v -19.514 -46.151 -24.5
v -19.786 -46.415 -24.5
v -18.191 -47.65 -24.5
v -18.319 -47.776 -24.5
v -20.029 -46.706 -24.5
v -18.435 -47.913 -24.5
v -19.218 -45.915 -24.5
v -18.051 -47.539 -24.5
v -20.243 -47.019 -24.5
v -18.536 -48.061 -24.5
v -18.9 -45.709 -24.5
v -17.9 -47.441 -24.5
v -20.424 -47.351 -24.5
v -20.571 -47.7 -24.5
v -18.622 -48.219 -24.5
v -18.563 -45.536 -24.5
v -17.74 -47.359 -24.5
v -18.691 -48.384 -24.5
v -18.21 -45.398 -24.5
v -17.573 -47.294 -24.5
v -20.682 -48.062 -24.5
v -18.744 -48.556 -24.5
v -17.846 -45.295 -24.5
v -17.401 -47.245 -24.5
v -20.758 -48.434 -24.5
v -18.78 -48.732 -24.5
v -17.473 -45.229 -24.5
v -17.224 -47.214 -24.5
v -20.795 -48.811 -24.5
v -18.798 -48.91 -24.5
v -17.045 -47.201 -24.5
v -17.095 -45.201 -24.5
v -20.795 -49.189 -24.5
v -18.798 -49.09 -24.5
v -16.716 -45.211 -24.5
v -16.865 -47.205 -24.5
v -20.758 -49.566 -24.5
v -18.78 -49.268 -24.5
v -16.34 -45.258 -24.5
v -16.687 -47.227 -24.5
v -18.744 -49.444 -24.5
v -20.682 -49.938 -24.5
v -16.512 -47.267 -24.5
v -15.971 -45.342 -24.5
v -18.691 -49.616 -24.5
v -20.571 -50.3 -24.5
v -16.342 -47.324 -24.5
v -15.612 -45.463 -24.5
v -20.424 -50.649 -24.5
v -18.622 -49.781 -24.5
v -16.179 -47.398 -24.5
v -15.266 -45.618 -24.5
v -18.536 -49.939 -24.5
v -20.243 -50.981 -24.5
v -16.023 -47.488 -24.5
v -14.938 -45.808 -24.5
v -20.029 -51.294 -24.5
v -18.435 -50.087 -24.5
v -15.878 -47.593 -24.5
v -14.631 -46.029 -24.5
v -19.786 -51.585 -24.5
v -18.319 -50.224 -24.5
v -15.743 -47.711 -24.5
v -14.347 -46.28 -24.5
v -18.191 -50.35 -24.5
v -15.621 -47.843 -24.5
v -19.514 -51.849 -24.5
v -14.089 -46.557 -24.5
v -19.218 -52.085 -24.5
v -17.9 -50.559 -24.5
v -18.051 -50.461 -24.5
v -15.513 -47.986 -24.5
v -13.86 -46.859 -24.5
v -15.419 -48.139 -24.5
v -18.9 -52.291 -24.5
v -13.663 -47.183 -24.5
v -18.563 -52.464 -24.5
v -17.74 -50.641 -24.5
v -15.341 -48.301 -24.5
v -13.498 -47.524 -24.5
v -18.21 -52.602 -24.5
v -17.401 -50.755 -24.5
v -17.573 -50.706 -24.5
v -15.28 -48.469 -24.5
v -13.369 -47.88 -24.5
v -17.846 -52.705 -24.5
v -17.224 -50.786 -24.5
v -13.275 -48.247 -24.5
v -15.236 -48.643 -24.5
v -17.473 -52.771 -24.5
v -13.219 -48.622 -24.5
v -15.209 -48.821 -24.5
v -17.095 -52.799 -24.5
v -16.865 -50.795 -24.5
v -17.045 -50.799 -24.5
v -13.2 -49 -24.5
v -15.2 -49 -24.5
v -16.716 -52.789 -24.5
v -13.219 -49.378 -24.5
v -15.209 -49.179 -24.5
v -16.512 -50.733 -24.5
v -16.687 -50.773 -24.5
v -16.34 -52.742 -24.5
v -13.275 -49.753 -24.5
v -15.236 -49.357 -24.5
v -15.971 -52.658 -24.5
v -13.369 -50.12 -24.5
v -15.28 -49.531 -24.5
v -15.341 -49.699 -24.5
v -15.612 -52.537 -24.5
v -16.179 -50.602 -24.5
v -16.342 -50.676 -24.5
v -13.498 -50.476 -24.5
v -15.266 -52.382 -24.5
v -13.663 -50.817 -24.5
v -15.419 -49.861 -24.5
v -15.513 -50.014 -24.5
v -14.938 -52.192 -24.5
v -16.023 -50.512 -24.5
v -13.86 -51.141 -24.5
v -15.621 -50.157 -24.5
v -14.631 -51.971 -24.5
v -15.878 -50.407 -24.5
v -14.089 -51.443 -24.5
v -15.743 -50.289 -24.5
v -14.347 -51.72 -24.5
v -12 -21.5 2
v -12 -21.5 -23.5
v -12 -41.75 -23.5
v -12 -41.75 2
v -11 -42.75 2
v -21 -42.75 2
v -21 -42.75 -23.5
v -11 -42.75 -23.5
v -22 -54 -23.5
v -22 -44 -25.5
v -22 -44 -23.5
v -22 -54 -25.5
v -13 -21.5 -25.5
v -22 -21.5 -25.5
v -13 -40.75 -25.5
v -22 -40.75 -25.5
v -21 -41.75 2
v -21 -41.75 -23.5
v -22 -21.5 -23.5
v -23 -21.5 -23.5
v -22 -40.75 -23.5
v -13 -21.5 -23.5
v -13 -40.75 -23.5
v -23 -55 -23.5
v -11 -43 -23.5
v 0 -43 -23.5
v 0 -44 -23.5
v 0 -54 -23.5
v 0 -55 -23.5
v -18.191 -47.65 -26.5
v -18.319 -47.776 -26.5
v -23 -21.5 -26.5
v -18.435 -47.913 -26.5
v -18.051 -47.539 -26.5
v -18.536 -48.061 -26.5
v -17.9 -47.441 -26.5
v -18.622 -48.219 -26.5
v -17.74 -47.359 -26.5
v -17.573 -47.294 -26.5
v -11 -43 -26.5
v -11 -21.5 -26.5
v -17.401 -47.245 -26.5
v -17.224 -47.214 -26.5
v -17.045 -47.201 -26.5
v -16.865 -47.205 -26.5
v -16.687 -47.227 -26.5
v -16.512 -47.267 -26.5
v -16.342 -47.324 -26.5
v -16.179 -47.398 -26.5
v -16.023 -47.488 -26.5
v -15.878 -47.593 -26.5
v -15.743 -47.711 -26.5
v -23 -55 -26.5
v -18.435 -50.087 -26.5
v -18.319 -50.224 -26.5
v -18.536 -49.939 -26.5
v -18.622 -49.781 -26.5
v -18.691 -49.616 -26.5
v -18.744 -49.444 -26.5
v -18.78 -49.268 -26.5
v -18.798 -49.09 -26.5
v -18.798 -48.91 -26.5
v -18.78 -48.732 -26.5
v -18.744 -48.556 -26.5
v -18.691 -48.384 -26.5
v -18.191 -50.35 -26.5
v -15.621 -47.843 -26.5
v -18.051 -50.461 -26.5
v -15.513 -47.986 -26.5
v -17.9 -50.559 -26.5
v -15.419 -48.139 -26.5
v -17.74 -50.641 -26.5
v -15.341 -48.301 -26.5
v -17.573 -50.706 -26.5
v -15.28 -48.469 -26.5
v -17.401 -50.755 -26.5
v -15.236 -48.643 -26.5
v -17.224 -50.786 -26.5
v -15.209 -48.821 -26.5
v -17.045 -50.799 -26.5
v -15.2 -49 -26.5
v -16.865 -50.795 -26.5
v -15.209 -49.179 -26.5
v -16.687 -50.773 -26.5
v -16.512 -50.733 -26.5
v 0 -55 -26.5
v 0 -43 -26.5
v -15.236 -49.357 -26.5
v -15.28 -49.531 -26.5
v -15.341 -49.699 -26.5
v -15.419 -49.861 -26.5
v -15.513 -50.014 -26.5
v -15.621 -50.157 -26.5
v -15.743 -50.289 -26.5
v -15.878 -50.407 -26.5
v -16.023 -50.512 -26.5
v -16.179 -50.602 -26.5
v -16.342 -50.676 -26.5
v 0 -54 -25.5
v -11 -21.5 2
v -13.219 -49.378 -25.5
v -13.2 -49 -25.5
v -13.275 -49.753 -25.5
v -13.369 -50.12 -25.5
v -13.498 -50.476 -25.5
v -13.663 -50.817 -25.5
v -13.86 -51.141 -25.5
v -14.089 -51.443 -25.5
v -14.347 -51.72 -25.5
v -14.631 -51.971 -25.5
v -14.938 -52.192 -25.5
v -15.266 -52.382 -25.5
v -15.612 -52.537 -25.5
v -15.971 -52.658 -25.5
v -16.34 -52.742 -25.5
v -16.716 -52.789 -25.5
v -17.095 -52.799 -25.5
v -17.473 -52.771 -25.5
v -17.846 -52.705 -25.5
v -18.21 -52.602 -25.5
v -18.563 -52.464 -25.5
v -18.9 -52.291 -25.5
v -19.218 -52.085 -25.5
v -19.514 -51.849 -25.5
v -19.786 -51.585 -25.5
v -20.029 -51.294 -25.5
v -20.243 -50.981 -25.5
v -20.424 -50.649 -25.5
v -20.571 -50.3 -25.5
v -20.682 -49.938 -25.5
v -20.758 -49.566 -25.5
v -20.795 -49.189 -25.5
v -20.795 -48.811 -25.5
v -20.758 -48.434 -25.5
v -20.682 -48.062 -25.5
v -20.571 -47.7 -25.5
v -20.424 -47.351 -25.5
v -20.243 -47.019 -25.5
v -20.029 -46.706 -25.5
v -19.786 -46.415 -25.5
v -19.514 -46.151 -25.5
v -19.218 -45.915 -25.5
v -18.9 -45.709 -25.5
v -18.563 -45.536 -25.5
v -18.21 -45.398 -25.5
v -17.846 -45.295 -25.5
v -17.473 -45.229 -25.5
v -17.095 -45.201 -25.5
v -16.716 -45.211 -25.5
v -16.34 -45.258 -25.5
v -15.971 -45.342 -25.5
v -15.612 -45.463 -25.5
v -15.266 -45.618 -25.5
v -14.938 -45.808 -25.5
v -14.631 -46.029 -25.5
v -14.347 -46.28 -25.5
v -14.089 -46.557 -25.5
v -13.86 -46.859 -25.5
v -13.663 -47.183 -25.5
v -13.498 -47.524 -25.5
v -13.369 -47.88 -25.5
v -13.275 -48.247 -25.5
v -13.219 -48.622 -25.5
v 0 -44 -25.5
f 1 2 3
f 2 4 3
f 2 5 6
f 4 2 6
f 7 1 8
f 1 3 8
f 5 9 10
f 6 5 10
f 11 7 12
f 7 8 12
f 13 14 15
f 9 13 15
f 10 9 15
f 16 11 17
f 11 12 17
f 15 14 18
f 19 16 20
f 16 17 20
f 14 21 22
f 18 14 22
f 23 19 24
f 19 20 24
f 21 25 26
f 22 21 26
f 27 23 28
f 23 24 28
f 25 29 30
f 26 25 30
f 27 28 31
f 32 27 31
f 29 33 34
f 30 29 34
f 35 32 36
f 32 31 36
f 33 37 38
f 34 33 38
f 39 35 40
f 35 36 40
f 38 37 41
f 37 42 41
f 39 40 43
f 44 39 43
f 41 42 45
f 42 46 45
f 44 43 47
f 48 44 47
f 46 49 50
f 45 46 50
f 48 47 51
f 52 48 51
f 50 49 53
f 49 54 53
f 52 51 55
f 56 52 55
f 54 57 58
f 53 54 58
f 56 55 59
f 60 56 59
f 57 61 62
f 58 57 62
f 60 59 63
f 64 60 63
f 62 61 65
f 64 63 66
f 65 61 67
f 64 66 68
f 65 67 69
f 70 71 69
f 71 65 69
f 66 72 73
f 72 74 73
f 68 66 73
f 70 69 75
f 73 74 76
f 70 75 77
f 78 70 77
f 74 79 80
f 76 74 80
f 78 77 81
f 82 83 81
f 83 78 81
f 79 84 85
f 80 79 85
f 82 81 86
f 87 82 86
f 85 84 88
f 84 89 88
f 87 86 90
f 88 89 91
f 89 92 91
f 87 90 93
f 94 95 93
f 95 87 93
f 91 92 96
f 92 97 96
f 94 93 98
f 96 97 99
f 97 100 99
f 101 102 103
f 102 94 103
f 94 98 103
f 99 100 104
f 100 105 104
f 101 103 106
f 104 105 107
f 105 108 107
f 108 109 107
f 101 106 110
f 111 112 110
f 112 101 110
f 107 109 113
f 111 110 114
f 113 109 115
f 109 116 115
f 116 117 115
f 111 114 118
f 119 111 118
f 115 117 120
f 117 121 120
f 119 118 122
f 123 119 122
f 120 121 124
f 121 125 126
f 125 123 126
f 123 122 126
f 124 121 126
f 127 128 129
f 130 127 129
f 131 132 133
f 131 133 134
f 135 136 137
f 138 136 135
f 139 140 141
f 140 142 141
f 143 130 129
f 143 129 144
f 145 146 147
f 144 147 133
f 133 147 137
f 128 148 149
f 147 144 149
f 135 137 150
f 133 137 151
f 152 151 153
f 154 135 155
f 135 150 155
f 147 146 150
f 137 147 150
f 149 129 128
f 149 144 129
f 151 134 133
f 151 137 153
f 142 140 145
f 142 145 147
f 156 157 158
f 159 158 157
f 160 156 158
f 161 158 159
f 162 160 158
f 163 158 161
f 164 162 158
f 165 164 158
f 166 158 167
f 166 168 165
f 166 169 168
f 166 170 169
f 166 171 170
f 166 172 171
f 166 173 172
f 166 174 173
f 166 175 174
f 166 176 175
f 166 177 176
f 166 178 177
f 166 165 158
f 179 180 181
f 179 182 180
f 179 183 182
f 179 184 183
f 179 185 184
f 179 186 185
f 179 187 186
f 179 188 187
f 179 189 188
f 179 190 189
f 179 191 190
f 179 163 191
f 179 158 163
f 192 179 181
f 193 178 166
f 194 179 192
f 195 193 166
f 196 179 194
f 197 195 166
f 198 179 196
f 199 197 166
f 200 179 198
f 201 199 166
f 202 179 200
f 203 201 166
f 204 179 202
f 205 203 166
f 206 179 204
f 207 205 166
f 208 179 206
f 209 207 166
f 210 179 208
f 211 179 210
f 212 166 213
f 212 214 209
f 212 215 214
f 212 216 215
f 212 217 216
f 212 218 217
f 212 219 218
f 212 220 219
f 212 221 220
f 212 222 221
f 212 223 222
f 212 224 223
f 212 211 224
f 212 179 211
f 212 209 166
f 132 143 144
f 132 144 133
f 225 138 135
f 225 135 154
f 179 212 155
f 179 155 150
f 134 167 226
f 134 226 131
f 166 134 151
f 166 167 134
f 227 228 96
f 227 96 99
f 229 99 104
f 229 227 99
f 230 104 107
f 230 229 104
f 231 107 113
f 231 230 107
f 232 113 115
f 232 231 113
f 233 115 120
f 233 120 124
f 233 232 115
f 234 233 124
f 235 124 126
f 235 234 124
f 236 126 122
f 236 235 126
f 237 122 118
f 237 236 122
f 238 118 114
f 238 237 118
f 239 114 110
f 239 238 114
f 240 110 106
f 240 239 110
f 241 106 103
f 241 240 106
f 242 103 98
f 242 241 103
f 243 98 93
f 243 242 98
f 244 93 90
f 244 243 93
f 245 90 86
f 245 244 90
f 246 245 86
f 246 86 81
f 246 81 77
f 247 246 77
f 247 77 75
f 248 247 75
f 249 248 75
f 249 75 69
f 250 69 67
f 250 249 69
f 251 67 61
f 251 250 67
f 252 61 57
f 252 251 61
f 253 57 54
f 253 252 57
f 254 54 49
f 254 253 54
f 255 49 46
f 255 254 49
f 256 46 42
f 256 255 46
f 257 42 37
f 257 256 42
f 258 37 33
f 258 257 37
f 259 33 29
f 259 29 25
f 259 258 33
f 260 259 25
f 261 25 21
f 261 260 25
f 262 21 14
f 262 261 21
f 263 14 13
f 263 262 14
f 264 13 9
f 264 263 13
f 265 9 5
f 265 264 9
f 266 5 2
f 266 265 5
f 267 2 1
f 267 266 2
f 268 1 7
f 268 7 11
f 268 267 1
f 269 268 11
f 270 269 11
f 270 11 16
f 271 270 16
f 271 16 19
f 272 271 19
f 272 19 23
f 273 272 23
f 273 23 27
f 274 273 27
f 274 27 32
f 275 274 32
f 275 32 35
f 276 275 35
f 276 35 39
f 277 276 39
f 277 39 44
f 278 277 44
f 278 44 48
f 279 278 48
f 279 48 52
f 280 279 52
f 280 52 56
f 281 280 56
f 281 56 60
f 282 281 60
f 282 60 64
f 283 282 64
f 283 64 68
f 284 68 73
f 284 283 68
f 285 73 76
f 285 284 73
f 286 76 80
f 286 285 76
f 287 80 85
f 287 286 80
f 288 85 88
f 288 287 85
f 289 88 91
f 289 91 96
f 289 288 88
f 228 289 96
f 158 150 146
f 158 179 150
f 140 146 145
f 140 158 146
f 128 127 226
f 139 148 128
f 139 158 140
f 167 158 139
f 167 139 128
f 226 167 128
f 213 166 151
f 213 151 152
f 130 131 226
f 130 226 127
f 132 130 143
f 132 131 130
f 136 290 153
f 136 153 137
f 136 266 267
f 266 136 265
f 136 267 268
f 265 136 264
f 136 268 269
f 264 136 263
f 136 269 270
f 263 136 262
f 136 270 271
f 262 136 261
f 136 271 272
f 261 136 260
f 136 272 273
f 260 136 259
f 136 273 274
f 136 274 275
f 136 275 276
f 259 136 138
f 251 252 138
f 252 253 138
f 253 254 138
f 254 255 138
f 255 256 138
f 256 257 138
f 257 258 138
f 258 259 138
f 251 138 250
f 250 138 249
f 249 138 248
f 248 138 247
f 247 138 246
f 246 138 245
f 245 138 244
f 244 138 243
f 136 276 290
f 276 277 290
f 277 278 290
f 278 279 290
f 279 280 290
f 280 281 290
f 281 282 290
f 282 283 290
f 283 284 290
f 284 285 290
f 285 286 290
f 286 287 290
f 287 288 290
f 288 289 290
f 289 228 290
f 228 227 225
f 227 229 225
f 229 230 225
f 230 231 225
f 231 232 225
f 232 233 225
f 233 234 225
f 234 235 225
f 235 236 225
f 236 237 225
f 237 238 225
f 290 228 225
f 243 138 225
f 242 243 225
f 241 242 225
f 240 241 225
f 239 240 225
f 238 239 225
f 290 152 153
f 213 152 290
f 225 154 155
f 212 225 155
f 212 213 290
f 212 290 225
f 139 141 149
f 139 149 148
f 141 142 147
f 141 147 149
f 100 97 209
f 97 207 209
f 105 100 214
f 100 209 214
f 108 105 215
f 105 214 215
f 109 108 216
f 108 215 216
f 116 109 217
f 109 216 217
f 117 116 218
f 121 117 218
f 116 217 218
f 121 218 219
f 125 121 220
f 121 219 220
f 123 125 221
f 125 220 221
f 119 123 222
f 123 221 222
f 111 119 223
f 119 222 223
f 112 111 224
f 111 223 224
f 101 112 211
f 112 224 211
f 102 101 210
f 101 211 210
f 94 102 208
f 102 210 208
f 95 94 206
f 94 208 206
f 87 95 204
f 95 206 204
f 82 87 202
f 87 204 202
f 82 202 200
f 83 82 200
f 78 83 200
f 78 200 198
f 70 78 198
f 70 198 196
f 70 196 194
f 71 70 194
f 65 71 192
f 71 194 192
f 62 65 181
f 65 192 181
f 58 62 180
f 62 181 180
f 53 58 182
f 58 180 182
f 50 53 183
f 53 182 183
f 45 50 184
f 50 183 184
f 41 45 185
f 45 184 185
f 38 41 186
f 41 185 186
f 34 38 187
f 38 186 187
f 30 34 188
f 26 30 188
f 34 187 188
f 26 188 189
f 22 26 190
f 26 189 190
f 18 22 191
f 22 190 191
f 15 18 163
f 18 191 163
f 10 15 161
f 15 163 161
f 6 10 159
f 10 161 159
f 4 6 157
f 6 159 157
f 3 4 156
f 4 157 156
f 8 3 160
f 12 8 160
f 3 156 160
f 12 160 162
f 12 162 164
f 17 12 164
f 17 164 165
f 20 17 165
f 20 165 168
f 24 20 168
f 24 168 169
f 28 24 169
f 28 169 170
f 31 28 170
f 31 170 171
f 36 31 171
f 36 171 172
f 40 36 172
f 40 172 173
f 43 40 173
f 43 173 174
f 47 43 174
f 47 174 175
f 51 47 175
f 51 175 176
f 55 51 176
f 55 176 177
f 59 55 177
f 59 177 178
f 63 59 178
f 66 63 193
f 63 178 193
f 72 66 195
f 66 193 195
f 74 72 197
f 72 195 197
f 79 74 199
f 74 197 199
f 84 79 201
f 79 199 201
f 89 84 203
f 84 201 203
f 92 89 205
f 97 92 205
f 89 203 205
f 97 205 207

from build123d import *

# Parameters (mm, degrees)
SKETCH006_R      = 1.8
EXTRUDE004_DEPTH = 1
EXTRUDE005_DEPTH = 2
SKETCH017_R      = 3.8
SKETCH017_R_2    = 1.8
EXTRUDE014_DEPTH = 1
EXTRUDE003_DEPTH = 27.5


with BuildPart() as extrude004:
    # Sketch006 → Extrude004 (new body)
    with BuildSketch(Plane.XY.offset(10)):
        Polygon((-11, 0), (0, 0), (0, 12), (-23, 12), (-23, -21.5), (-11, -21.5), align=None)
        with Locations((-17, 6)):
            Circle(SKETCH006_R, mode=Mode.SUBTRACT)
    extrude(amount=EXTRUDE004_DEPTH)


with BuildPart() as extrude004_1:
    # Extrude004 placement: moved
    add(extrude004.part.moved(Location((0, 0, -36.5))))


with BuildPart() as extrude005:
    # Sketch007 → Extrude005 (new body)
    with BuildSketch(Plane.XY.offset(10)):
        Polygon((0, 12), (-23, 12), (-23, -21.5), (-22, -21.5), (-22, -2.25), (-13, -2.25), (-13, -21.5), (-11, -21.5), (-11, 0), (0, 0), (0, 1), (-22, 1), (-22, 11), (0, 11), align=None)
    extrude(amount=EXTRUDE005_DEPTH)


with BuildPart() as extrude005_1:
    # Extrude005 placement: moved
    add(extrude005.part.moved(Location((0, 0, -35.5))))


with BuildPart() as extrude014:
    # Sketch017 → Extrude014 (new body)
    with BuildSketch(Plane.XY.offset(10)):
        with Locations((-17, 6)):
            Circle(SKETCH017_R)
        with Locations((-17, 6)):
            Circle(SKETCH017_R_2, mode=Mode.SUBTRACT)
    extrude(amount=EXTRUDE014_DEPTH)


with BuildPart() as extrude014_1:
    # Extrude014 placement: moved
    add(extrude014.part.moved(Location((0, 0, -35.5))))


with BuildPart() as body006:
    # Sketch003 → Extrude003 (new body)
    with BuildSketch(Plane.XY):
        Polygon((-21, -0.25), (-11, -0.25), (-11, -21.5), (-12, -21.5), (-12, -1.25), (-21, -1.25), align=None)
    extrude(amount=-EXTRUDE003_DEPTH)


with BuildPart() as body006_1:
    # Extrude003 placement: moved
    add(body006.part.moved(Location((0, 0, 2))))

    # Fusion013: union Extrude004, Extrude005, Extrude014
    add(extrude004_1.part)
    add(extrude005_1.part)
    add(extrude014_1.part)


with BuildPart() as part_mirroring007:
    # Part__Mirroring007: instance of Body006
    add(body006_1.part.mirror(Plane(origin=(0, -21.5, 0), x_dir=(1, 0, 0), z_dir=(0, 1, 0))))


solid = part_mirroring007.part
